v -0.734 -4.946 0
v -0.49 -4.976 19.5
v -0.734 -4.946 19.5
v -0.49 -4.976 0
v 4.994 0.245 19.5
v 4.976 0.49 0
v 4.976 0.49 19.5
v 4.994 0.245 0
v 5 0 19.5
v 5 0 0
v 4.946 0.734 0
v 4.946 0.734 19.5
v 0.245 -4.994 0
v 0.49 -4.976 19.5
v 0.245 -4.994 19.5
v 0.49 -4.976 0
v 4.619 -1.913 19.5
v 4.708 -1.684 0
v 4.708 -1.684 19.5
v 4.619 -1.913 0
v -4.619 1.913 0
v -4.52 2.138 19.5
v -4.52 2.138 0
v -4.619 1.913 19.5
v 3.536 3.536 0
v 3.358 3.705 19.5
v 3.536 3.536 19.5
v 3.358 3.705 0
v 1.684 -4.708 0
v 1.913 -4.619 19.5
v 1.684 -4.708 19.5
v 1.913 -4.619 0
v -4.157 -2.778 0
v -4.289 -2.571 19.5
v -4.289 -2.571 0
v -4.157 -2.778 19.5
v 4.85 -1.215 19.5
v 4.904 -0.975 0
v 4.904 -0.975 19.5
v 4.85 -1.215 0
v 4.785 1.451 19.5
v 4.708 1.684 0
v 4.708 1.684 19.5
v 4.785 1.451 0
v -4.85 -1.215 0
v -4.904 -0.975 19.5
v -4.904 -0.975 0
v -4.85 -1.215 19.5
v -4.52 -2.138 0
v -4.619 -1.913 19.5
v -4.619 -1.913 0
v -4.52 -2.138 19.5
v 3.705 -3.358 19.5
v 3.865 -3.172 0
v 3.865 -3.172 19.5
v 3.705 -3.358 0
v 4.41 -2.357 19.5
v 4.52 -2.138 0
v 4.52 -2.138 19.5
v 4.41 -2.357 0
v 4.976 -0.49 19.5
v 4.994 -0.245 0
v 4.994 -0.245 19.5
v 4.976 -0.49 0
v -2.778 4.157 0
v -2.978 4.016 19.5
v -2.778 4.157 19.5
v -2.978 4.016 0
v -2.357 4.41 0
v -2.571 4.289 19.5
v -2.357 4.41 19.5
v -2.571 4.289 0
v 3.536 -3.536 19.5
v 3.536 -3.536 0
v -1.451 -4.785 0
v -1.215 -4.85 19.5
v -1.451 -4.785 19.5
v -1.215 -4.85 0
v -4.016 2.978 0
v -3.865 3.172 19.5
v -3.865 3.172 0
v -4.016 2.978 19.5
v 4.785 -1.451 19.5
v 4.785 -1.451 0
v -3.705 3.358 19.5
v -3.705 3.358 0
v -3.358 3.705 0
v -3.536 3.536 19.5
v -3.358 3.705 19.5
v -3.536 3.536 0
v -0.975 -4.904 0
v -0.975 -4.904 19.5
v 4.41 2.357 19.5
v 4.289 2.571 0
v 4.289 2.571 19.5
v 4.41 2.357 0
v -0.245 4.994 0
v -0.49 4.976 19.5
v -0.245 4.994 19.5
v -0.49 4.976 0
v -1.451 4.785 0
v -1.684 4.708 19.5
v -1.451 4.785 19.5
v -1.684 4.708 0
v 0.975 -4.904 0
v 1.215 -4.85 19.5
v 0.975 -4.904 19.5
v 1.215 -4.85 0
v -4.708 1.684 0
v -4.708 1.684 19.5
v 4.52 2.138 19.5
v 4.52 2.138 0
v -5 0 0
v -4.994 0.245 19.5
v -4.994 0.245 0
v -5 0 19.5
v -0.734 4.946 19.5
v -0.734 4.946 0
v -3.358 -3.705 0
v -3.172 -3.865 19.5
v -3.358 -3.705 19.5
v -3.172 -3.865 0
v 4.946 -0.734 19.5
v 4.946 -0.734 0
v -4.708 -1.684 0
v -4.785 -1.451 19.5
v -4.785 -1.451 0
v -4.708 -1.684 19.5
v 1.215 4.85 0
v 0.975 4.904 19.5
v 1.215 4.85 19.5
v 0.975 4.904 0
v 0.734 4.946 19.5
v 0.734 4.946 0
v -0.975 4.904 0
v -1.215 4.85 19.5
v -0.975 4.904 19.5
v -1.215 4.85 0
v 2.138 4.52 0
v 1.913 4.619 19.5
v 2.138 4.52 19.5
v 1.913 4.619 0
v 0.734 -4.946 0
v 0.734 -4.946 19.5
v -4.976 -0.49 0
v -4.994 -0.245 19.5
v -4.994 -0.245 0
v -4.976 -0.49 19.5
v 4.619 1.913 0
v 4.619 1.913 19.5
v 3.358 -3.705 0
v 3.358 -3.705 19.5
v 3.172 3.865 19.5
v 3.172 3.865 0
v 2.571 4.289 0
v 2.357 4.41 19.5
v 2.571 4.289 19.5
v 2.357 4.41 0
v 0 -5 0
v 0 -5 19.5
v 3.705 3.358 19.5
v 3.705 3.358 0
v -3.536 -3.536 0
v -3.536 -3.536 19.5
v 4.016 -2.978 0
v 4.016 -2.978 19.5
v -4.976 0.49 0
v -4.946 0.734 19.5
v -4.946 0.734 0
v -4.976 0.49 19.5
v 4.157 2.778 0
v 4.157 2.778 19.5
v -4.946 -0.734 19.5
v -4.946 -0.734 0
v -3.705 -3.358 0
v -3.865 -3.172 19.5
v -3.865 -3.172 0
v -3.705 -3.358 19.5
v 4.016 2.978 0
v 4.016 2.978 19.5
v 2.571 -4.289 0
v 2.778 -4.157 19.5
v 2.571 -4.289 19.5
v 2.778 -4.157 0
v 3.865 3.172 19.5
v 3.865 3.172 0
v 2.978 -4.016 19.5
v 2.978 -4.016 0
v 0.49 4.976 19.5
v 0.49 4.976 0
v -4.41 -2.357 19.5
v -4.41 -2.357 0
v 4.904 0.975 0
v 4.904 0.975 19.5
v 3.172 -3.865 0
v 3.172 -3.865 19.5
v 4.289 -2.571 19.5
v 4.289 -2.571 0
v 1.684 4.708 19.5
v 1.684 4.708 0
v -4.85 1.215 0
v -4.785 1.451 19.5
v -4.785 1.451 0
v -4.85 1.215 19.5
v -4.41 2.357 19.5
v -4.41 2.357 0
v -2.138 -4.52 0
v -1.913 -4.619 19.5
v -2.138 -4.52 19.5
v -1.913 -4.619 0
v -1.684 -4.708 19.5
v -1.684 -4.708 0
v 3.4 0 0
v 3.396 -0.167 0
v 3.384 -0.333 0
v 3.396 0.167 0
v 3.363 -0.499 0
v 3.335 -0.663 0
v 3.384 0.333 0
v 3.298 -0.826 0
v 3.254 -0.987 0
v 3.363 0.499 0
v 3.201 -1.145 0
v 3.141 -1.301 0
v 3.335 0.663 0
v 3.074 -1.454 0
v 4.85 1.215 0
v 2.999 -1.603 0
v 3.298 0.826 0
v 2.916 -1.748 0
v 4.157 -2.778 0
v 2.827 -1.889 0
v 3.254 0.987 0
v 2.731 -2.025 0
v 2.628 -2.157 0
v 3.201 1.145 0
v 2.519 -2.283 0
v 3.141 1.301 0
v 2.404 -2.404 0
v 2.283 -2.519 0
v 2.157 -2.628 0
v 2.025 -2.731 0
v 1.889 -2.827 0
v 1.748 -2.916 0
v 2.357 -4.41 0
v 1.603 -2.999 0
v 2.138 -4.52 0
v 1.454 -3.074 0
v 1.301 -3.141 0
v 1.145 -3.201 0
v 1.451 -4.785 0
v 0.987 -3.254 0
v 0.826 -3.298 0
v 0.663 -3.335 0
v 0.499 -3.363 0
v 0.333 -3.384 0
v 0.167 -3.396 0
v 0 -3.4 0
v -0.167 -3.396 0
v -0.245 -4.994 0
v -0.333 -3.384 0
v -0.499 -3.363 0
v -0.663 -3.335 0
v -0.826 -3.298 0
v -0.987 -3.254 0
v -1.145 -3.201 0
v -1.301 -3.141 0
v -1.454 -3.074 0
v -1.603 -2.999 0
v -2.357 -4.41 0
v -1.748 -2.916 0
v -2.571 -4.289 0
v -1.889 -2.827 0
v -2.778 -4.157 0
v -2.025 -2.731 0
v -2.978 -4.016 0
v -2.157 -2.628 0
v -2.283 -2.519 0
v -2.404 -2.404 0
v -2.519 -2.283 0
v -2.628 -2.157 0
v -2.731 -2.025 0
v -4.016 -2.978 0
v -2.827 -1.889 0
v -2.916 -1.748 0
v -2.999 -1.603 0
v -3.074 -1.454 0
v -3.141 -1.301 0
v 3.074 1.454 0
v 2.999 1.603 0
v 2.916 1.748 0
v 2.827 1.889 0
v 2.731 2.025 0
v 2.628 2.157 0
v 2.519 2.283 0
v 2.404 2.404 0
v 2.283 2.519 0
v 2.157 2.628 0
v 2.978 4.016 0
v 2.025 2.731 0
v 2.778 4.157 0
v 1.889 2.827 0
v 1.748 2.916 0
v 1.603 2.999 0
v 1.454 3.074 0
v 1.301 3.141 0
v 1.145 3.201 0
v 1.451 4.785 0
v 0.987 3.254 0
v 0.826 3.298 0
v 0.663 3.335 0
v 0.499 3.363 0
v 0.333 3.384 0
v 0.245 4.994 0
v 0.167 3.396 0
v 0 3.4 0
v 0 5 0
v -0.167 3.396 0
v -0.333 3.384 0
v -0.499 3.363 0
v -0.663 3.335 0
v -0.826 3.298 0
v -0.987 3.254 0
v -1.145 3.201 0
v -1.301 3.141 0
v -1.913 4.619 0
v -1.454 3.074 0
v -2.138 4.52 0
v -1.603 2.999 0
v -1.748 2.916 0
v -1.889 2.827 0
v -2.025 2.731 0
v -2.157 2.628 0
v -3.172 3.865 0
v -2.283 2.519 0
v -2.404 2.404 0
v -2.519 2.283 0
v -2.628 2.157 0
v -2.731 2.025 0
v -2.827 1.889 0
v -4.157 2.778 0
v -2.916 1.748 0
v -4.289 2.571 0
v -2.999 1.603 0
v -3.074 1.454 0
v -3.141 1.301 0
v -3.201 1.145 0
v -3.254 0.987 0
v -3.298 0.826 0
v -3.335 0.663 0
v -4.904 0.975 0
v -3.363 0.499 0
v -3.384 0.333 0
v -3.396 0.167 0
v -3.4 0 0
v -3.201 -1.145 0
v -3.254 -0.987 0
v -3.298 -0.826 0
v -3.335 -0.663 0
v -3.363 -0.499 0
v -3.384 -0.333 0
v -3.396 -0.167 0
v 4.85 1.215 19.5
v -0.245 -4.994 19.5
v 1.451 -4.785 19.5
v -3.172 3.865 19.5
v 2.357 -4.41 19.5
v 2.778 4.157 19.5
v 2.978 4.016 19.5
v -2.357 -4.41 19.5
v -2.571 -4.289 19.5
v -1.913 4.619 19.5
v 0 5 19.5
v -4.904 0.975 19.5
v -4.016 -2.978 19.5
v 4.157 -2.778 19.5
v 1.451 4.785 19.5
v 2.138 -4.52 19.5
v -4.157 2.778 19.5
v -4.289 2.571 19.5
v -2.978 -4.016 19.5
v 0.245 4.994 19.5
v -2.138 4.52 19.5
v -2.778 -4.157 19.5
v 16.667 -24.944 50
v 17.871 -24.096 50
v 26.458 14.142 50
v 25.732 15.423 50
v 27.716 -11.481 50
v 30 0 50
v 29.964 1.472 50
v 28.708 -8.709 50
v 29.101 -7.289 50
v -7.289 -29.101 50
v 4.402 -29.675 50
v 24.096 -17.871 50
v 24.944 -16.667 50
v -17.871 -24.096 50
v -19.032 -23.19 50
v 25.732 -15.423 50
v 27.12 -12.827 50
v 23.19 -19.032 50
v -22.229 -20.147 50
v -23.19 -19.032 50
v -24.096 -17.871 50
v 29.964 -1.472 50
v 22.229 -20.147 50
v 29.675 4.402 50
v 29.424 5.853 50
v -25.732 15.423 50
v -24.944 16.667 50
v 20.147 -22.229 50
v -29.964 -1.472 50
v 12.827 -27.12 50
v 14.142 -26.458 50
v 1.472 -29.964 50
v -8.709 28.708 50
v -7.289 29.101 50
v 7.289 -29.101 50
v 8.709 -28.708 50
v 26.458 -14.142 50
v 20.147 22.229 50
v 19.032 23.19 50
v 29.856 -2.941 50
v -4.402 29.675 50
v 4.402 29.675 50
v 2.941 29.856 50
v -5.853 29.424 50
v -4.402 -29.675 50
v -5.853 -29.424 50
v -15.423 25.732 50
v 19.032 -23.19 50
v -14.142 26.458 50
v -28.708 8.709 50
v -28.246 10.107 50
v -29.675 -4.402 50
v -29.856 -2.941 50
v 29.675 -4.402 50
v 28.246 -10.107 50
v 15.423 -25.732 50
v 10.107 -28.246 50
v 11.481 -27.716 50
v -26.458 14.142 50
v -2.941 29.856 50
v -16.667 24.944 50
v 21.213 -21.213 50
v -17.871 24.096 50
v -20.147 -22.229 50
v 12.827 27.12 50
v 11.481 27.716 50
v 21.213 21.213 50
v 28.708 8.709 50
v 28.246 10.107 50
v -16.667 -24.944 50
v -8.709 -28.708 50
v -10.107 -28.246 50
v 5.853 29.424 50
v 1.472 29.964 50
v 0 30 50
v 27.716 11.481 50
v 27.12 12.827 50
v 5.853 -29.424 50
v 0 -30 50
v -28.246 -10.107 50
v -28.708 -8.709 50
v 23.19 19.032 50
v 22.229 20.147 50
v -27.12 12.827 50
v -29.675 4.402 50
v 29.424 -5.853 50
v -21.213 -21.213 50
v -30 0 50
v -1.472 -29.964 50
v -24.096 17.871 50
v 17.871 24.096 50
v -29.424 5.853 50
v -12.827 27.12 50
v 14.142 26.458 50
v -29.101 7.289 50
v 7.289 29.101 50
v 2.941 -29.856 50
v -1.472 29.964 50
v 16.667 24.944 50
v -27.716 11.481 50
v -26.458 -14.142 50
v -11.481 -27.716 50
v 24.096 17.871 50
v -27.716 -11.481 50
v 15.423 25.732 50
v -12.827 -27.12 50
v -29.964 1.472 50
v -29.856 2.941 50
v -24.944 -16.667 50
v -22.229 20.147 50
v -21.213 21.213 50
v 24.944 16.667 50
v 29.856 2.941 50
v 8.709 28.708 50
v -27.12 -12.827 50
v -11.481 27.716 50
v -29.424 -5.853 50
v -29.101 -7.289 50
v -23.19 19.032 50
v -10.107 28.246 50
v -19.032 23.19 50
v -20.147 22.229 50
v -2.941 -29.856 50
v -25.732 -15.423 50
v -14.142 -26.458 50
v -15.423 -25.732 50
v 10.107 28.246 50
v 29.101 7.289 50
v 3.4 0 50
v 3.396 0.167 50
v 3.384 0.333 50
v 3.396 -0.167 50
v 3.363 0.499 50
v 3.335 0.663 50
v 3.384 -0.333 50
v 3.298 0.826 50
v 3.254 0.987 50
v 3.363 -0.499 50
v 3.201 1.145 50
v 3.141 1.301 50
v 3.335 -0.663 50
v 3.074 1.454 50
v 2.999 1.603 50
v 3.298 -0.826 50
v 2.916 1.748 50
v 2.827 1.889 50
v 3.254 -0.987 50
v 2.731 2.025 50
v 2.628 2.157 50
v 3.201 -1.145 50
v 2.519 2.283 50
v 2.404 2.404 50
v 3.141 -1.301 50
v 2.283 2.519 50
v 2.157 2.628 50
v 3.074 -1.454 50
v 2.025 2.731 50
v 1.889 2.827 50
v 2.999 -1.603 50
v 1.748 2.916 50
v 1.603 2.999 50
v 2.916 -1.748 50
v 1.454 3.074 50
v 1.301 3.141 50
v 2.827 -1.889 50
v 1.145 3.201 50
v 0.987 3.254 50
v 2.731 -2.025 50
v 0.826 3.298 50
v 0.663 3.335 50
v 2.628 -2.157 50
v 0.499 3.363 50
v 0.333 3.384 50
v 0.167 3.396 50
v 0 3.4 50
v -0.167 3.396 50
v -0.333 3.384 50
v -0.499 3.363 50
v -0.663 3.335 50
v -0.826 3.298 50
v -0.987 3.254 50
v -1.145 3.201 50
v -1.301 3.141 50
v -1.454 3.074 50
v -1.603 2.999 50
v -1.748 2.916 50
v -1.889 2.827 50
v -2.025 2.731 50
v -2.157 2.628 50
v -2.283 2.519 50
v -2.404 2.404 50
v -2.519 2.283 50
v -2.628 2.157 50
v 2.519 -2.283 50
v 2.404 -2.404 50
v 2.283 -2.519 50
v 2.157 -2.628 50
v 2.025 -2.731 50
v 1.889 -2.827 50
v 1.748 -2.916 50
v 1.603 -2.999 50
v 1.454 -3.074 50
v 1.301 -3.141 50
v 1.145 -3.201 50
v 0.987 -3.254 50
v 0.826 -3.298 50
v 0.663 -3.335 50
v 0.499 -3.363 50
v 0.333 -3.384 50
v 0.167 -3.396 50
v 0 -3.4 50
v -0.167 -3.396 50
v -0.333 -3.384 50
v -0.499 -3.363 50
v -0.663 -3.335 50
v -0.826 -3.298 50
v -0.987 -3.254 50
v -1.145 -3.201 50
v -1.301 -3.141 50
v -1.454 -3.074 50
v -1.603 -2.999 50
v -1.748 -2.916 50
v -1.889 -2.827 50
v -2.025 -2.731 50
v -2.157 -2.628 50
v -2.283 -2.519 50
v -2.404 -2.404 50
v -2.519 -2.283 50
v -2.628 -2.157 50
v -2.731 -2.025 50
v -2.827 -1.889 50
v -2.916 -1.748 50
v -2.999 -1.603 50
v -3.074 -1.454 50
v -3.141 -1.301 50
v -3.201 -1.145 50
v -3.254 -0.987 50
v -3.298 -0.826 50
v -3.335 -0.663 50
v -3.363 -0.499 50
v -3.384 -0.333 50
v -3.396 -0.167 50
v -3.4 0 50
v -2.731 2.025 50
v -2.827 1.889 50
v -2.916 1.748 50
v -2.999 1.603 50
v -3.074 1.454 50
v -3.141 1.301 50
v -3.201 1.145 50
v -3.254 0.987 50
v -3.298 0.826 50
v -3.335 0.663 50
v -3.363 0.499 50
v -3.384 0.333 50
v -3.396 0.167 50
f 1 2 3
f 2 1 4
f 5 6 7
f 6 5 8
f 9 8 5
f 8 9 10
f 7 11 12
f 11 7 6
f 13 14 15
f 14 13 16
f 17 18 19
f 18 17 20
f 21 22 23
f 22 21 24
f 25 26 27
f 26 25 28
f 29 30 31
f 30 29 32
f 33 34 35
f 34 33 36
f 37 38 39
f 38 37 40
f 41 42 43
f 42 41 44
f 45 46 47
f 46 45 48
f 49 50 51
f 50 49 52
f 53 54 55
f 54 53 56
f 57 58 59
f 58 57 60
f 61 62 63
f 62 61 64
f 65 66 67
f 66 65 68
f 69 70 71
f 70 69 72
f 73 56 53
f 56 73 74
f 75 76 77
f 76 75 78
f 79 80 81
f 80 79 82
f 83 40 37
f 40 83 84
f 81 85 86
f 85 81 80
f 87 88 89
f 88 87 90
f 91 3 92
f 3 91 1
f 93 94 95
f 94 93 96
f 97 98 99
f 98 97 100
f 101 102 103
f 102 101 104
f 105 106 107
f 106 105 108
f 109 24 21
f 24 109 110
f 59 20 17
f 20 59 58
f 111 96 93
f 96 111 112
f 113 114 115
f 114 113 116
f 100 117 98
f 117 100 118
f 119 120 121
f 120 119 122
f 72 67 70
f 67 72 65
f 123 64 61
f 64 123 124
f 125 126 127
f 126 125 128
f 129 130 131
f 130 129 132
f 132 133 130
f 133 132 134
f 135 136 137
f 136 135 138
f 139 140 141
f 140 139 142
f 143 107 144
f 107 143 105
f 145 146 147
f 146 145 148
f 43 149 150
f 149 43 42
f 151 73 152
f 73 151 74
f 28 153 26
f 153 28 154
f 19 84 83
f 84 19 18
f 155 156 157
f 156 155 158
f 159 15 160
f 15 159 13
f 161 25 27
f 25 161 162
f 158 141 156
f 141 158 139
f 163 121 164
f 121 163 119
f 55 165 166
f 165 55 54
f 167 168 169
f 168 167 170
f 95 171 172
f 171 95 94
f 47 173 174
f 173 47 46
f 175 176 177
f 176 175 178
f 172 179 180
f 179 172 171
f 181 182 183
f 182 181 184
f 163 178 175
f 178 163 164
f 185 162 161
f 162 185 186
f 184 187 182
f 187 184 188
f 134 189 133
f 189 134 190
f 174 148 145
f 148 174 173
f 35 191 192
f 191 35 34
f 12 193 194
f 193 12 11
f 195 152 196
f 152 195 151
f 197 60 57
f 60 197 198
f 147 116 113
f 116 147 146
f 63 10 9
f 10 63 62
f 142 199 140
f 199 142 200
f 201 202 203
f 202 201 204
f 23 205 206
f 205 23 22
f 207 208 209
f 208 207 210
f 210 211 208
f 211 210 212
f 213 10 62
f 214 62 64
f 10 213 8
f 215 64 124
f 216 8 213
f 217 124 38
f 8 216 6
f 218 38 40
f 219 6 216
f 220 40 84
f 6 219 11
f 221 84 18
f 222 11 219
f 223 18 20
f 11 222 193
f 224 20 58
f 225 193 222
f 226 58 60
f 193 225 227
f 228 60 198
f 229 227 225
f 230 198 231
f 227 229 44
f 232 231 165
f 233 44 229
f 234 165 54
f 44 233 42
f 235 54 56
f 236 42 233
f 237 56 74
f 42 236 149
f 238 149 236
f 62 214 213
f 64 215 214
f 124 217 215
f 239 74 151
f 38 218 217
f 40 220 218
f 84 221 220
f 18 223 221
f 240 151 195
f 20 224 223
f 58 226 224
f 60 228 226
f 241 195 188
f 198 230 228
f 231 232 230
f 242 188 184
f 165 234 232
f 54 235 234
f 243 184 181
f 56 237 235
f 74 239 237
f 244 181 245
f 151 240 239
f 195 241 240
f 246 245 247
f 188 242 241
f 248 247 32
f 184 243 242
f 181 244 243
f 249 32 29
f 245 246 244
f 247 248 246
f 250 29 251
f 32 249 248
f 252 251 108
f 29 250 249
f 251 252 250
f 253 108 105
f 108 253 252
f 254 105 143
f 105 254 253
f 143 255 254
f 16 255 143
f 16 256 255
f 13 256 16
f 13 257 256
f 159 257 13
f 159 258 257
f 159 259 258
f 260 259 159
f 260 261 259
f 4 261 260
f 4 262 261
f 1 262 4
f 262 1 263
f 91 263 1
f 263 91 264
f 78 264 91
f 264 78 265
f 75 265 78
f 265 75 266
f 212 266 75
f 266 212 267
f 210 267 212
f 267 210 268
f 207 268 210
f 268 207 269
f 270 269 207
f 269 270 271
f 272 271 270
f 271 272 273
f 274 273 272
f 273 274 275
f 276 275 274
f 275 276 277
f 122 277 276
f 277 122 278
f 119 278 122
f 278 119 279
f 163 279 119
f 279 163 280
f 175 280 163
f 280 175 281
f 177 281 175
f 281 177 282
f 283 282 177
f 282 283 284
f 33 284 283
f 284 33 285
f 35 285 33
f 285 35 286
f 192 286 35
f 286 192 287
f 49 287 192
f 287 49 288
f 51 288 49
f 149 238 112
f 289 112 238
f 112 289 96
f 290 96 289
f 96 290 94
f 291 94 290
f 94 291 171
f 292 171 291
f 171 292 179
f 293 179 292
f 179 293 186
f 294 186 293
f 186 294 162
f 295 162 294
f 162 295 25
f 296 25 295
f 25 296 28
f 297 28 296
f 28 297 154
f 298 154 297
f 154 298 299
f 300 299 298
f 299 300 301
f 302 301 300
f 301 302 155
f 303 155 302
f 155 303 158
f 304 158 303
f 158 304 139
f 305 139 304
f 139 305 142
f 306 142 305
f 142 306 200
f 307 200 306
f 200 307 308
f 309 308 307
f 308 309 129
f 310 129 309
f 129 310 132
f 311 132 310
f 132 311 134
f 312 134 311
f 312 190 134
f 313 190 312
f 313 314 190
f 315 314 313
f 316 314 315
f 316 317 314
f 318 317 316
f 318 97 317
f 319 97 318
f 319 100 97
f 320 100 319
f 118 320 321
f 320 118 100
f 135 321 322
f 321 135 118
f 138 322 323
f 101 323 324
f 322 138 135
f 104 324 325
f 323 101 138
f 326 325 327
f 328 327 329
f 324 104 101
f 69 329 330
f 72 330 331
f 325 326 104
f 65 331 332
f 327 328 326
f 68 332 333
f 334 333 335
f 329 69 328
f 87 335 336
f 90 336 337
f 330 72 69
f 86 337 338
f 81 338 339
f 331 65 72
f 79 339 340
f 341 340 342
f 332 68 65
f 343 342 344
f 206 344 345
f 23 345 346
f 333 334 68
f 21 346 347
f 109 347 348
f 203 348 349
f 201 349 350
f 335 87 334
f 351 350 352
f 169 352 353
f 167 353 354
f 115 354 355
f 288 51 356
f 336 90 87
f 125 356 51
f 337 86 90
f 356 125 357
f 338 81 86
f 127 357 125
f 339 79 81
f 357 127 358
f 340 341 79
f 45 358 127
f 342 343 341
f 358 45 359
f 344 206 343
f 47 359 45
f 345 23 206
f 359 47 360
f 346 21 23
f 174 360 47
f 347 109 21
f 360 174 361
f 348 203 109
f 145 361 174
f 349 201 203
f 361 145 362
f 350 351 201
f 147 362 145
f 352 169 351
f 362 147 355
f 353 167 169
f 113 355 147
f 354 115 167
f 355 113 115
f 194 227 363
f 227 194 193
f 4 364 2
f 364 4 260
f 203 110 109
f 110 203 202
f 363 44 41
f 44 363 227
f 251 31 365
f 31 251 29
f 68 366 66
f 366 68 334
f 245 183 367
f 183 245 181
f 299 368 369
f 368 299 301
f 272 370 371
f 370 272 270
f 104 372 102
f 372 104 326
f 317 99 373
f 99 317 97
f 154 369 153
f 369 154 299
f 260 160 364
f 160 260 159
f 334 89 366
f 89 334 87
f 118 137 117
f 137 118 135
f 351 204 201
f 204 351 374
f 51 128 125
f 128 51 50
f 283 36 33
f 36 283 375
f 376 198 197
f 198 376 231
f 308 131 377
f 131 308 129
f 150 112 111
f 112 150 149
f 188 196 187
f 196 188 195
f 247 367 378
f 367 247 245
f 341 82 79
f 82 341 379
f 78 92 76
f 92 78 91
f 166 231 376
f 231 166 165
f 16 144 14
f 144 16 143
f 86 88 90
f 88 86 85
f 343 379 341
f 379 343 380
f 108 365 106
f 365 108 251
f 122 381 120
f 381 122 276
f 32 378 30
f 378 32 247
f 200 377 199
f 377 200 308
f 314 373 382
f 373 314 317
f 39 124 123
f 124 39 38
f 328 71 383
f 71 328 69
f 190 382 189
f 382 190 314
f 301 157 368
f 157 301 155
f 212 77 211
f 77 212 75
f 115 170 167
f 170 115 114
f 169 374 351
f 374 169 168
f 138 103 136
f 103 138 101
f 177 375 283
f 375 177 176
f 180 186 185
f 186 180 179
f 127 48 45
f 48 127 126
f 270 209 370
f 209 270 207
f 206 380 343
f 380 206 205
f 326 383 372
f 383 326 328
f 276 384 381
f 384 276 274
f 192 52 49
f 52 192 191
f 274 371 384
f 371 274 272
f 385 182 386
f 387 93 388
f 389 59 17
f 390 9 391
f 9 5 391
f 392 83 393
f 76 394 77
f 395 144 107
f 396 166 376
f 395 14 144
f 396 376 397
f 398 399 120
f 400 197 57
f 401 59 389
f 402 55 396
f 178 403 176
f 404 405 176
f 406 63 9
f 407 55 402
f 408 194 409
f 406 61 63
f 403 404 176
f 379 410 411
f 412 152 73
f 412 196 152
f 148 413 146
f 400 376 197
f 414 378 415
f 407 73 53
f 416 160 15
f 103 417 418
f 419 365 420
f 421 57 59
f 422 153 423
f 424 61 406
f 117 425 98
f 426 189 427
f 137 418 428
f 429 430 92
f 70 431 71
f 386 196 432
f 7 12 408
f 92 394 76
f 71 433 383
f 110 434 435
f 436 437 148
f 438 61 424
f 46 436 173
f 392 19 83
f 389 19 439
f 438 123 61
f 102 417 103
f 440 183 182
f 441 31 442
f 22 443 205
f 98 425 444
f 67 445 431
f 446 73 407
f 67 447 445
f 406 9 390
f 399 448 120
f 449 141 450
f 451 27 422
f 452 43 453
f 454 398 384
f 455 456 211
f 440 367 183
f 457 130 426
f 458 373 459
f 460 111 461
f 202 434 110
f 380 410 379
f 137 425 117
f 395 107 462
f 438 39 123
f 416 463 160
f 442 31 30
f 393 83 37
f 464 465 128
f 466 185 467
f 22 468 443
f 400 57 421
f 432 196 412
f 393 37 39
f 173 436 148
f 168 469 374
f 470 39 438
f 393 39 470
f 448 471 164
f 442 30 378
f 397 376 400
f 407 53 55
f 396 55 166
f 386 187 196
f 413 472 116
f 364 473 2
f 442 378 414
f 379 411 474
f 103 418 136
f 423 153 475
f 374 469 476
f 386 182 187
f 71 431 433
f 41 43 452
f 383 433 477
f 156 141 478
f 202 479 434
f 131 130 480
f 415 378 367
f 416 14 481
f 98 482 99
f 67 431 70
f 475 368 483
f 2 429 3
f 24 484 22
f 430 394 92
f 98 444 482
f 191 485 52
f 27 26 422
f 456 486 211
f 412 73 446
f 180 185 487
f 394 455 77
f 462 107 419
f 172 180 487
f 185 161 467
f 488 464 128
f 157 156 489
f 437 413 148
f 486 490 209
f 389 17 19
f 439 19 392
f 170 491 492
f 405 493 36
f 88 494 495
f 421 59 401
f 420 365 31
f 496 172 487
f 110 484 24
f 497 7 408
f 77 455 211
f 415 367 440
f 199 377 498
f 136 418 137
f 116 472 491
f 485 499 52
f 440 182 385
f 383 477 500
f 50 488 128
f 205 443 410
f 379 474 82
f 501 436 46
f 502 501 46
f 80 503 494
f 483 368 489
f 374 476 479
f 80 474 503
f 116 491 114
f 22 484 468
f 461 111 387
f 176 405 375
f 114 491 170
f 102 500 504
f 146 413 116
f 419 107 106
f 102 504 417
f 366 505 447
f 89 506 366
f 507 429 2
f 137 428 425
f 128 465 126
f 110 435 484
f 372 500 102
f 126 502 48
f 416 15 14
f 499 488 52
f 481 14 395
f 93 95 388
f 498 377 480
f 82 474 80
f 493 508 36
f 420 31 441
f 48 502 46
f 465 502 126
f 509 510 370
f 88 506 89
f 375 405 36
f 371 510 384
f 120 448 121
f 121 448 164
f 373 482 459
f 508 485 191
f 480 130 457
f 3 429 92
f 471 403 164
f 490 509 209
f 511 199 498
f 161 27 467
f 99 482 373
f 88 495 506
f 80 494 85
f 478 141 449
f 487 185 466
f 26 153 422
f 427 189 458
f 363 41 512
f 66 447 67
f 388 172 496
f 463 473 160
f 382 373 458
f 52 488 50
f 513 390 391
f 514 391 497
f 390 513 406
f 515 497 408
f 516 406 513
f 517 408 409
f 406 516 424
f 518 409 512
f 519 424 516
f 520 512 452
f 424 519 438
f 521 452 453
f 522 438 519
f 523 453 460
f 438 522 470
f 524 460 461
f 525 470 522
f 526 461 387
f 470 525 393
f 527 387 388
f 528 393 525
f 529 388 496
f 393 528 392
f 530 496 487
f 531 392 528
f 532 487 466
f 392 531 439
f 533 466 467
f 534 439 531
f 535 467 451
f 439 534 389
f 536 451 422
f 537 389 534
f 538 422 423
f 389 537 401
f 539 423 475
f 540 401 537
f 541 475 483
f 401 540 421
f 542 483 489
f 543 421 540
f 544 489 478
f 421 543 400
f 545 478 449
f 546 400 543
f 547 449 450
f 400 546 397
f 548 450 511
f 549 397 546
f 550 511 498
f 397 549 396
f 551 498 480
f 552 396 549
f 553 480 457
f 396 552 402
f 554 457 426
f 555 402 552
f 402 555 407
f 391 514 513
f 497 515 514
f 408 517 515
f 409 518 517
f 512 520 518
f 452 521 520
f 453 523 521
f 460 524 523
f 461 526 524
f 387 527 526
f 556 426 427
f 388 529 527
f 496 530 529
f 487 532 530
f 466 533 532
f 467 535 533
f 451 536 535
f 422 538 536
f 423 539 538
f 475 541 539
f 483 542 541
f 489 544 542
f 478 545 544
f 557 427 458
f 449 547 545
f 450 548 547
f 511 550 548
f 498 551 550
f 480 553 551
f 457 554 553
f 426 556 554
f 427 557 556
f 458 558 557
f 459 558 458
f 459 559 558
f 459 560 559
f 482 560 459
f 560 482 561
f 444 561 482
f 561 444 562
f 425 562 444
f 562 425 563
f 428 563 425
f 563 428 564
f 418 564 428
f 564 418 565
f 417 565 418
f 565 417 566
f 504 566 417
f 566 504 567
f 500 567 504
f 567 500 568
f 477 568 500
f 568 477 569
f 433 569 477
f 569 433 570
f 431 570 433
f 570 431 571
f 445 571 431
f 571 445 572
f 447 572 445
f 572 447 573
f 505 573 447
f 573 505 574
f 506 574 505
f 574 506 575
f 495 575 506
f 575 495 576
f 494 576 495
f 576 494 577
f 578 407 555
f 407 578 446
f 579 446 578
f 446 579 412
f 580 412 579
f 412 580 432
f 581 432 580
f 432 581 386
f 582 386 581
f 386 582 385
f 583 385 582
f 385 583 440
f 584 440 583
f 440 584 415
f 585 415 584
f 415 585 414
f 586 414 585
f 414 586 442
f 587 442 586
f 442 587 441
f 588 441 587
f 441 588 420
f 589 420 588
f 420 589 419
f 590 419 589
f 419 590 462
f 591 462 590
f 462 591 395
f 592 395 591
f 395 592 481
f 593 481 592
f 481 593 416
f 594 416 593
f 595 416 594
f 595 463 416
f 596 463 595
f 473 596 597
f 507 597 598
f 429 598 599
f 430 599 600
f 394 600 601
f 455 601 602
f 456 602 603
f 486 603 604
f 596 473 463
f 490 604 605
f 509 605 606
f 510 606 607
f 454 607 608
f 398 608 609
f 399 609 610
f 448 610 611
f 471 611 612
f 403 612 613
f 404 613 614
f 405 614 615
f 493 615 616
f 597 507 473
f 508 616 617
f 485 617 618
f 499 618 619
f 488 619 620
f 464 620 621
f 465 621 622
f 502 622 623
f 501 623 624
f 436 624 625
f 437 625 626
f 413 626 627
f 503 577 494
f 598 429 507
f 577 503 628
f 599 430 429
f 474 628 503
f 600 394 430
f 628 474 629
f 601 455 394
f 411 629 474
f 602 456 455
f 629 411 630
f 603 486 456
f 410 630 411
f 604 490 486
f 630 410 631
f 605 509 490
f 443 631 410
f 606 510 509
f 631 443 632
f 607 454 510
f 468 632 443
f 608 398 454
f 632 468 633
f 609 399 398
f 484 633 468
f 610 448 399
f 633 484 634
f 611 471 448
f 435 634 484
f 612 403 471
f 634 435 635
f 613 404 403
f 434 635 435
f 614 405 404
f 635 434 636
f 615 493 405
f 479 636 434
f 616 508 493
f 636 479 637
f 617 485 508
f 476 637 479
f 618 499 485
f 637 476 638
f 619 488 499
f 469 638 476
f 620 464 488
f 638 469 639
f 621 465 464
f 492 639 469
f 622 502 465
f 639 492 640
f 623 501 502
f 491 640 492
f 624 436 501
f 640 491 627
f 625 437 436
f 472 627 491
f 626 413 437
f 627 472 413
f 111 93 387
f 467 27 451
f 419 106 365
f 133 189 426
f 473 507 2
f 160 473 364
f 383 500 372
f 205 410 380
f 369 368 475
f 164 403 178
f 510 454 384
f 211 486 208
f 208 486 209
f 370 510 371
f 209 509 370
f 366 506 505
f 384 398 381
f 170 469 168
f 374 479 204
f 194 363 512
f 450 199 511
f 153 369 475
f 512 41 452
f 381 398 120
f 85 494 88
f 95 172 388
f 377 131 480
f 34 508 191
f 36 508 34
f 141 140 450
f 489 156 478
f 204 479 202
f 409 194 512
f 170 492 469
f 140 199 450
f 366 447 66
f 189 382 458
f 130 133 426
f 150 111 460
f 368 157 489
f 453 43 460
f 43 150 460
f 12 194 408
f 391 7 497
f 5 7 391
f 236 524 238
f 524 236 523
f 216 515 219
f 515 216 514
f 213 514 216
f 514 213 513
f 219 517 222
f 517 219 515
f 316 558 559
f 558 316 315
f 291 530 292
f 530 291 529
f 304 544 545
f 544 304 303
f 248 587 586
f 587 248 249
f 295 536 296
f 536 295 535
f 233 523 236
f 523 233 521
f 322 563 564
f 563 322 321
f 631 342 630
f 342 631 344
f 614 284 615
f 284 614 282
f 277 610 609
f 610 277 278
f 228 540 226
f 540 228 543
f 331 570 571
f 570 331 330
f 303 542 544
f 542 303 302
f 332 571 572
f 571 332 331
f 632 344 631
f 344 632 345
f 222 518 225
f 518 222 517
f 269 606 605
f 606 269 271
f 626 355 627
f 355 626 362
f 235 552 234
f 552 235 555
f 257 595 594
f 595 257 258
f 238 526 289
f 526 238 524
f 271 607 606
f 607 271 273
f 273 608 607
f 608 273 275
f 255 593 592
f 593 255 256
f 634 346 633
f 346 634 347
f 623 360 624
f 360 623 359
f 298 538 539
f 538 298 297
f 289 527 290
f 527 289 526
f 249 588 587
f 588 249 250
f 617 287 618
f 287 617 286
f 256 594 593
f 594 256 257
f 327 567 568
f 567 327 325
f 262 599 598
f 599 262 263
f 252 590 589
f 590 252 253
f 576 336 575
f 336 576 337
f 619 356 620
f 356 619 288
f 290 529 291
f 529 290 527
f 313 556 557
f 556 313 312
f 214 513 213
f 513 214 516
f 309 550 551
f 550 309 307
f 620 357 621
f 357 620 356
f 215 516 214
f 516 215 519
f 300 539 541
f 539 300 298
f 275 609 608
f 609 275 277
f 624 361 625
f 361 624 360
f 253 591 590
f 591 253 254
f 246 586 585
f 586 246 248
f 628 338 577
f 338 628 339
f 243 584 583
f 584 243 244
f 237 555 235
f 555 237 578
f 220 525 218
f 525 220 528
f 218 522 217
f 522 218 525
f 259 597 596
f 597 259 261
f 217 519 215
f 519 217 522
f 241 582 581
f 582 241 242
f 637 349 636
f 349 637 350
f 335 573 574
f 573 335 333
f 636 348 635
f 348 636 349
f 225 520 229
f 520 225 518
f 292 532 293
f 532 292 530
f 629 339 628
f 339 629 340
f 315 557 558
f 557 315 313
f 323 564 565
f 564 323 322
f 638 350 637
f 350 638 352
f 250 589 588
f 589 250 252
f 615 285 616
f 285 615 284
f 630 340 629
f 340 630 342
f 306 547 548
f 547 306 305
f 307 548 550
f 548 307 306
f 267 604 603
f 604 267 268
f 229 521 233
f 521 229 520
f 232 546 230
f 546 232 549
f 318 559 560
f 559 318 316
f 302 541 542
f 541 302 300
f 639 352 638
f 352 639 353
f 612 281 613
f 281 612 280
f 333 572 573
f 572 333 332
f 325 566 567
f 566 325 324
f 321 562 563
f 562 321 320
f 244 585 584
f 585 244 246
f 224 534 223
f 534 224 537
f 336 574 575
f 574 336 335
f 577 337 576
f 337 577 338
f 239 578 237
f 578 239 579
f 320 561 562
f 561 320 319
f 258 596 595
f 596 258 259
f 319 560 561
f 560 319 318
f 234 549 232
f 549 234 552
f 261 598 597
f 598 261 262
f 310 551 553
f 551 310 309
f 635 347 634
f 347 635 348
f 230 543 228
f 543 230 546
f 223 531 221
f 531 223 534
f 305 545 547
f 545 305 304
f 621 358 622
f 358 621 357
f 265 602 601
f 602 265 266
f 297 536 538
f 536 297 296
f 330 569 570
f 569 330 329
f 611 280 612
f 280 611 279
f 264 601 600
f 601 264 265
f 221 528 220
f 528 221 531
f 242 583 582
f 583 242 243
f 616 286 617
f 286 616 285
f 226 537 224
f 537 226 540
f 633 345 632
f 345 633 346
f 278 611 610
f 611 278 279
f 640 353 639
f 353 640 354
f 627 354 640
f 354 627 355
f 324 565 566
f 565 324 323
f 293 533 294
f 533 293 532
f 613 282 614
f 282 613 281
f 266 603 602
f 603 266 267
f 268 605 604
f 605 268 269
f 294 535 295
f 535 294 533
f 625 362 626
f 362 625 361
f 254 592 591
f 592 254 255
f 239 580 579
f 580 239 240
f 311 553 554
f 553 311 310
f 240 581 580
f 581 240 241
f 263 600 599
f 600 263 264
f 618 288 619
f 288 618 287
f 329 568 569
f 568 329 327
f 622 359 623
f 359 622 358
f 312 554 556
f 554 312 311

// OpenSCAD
// Small lab funnel - printed upright, wide opening at the top
// All dimensions in millimetres

// ---- Parameters ----
spout_od      = 10;    // spout outer diameter (z = 0 to 20)
spout_len     = 20;    // spout length
spout_wall    = 1.6;   // spout wall thickness -> bore 6.8 mm

cone_top_d    = 60;    // cone outer diameter at rim (z = 50)
cone_bottom_d = 10;    // cone outer diameter at z = 20

total_h       = 50;    // overall height of part

eps           = 0.5;   // overlap for clean boolean cuts

$fn = 128;

// ---- Model ----
difference() {
    union() {
        // Straight spout
        cylinder(d = spout_od, h = spout_len);

        // Cone on top of spout (slightly overlapping for a solid union)
        translate([0, 0, spout_len - eps])
            cylinder(h = total_h - spout_len + eps,
                     d1 = spout_od,
                     d2 = cone_top_d);
    }

    // Central bore through the full height (liquid channel)
    translate([0, 0, -eps])
        cylinder(h = total_h + 2 * eps, d = spout_od - 2 * spout_wall);
}
